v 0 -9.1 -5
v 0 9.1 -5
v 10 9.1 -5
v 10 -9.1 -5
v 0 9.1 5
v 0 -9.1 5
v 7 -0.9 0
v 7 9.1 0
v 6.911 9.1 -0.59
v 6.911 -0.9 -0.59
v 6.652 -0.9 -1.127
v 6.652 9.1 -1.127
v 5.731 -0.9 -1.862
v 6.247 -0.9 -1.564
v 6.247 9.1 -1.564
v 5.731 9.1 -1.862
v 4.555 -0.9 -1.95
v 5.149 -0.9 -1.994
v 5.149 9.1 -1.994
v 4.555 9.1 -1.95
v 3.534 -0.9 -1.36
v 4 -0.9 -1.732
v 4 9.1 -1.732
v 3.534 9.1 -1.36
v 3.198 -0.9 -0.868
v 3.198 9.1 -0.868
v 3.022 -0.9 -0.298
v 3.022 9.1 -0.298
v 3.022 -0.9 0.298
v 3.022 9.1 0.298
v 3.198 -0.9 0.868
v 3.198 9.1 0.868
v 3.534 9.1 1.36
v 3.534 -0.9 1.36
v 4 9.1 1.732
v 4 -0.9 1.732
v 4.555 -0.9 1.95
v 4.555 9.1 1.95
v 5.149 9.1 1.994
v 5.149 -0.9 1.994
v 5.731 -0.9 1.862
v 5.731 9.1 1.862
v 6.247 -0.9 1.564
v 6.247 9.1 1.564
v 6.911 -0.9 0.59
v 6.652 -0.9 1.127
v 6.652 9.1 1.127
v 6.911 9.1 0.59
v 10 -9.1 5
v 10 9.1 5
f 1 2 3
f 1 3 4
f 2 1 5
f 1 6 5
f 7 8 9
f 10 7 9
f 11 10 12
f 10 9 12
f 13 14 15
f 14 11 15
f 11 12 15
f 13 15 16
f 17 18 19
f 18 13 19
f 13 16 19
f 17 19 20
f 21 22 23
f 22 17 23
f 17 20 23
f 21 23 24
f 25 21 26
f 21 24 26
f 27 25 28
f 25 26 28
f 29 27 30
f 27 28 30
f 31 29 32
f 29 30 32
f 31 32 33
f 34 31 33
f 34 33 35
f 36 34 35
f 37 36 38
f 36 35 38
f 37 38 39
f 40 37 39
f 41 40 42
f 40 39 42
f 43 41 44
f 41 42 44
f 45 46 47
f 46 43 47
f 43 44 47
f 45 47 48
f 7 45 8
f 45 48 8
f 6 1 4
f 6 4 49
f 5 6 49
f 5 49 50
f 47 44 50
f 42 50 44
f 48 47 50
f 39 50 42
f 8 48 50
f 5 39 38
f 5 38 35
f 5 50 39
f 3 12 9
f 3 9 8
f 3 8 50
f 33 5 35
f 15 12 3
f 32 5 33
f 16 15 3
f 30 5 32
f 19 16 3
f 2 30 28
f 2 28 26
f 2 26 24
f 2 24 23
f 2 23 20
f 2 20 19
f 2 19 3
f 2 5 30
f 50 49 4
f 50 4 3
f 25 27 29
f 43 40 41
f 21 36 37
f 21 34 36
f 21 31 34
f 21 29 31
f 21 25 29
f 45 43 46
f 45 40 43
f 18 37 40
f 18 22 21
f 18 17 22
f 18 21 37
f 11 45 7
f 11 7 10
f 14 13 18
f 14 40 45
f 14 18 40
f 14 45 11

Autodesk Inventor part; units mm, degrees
ref_plane "YZ Plane" through (0, 0, 0) normal (1, 0, 0) x (0, 1, 0)
ref_plane "XZ Plane" through (0, 0, 0) normal (0, 1, 0) x (-1, 0, 0)
ref_plane "XY Plane" through (0, 0, 0) normal (0, 0, 1) x (1, 0, 0)
sketch "Sketch1" plane through (0, 0, 0) normal (1, 0, 0) x (0, 1, 0)
  line L0 (-9.1, 5) -> (9.1, 5)
  line L1 (9.1, 5) -> (9.1, -5)
  line L2 (9.1, -5) -> (-9.1, -5)
  line L3 (-9.1, -5) -> (-9.1, 5)
  line L4 (-9.1, 5) -> (9.1, -5) construction
  line L5 (9.1, 5) -> (-9.1, -5) construction
  point P0 (0, 0)
  dimension "d0" = 18.2
  dimension "d1" = 10
extrude "Extrusion1" add sketch "Sketch1" along normal blind 10
sketch "Sketch2" plane through (0, 9.1, 5) normal (0, 1, 0) x (1, 0, 0)
  line L0 (0, 5) -> (5, 5)
  circle A0 centre (5, 5) radius 2
  dimension "d4" = 5
  dimension "d5" = 4
extrude "Extrusion2" cut sketch "Sketch2" against normal blind 10
thread "Thread1" size "M4x0.7" class "6H" standard "ANSI Metric M Profile" full length
properties part number "Rb PEEK - Soporte"
